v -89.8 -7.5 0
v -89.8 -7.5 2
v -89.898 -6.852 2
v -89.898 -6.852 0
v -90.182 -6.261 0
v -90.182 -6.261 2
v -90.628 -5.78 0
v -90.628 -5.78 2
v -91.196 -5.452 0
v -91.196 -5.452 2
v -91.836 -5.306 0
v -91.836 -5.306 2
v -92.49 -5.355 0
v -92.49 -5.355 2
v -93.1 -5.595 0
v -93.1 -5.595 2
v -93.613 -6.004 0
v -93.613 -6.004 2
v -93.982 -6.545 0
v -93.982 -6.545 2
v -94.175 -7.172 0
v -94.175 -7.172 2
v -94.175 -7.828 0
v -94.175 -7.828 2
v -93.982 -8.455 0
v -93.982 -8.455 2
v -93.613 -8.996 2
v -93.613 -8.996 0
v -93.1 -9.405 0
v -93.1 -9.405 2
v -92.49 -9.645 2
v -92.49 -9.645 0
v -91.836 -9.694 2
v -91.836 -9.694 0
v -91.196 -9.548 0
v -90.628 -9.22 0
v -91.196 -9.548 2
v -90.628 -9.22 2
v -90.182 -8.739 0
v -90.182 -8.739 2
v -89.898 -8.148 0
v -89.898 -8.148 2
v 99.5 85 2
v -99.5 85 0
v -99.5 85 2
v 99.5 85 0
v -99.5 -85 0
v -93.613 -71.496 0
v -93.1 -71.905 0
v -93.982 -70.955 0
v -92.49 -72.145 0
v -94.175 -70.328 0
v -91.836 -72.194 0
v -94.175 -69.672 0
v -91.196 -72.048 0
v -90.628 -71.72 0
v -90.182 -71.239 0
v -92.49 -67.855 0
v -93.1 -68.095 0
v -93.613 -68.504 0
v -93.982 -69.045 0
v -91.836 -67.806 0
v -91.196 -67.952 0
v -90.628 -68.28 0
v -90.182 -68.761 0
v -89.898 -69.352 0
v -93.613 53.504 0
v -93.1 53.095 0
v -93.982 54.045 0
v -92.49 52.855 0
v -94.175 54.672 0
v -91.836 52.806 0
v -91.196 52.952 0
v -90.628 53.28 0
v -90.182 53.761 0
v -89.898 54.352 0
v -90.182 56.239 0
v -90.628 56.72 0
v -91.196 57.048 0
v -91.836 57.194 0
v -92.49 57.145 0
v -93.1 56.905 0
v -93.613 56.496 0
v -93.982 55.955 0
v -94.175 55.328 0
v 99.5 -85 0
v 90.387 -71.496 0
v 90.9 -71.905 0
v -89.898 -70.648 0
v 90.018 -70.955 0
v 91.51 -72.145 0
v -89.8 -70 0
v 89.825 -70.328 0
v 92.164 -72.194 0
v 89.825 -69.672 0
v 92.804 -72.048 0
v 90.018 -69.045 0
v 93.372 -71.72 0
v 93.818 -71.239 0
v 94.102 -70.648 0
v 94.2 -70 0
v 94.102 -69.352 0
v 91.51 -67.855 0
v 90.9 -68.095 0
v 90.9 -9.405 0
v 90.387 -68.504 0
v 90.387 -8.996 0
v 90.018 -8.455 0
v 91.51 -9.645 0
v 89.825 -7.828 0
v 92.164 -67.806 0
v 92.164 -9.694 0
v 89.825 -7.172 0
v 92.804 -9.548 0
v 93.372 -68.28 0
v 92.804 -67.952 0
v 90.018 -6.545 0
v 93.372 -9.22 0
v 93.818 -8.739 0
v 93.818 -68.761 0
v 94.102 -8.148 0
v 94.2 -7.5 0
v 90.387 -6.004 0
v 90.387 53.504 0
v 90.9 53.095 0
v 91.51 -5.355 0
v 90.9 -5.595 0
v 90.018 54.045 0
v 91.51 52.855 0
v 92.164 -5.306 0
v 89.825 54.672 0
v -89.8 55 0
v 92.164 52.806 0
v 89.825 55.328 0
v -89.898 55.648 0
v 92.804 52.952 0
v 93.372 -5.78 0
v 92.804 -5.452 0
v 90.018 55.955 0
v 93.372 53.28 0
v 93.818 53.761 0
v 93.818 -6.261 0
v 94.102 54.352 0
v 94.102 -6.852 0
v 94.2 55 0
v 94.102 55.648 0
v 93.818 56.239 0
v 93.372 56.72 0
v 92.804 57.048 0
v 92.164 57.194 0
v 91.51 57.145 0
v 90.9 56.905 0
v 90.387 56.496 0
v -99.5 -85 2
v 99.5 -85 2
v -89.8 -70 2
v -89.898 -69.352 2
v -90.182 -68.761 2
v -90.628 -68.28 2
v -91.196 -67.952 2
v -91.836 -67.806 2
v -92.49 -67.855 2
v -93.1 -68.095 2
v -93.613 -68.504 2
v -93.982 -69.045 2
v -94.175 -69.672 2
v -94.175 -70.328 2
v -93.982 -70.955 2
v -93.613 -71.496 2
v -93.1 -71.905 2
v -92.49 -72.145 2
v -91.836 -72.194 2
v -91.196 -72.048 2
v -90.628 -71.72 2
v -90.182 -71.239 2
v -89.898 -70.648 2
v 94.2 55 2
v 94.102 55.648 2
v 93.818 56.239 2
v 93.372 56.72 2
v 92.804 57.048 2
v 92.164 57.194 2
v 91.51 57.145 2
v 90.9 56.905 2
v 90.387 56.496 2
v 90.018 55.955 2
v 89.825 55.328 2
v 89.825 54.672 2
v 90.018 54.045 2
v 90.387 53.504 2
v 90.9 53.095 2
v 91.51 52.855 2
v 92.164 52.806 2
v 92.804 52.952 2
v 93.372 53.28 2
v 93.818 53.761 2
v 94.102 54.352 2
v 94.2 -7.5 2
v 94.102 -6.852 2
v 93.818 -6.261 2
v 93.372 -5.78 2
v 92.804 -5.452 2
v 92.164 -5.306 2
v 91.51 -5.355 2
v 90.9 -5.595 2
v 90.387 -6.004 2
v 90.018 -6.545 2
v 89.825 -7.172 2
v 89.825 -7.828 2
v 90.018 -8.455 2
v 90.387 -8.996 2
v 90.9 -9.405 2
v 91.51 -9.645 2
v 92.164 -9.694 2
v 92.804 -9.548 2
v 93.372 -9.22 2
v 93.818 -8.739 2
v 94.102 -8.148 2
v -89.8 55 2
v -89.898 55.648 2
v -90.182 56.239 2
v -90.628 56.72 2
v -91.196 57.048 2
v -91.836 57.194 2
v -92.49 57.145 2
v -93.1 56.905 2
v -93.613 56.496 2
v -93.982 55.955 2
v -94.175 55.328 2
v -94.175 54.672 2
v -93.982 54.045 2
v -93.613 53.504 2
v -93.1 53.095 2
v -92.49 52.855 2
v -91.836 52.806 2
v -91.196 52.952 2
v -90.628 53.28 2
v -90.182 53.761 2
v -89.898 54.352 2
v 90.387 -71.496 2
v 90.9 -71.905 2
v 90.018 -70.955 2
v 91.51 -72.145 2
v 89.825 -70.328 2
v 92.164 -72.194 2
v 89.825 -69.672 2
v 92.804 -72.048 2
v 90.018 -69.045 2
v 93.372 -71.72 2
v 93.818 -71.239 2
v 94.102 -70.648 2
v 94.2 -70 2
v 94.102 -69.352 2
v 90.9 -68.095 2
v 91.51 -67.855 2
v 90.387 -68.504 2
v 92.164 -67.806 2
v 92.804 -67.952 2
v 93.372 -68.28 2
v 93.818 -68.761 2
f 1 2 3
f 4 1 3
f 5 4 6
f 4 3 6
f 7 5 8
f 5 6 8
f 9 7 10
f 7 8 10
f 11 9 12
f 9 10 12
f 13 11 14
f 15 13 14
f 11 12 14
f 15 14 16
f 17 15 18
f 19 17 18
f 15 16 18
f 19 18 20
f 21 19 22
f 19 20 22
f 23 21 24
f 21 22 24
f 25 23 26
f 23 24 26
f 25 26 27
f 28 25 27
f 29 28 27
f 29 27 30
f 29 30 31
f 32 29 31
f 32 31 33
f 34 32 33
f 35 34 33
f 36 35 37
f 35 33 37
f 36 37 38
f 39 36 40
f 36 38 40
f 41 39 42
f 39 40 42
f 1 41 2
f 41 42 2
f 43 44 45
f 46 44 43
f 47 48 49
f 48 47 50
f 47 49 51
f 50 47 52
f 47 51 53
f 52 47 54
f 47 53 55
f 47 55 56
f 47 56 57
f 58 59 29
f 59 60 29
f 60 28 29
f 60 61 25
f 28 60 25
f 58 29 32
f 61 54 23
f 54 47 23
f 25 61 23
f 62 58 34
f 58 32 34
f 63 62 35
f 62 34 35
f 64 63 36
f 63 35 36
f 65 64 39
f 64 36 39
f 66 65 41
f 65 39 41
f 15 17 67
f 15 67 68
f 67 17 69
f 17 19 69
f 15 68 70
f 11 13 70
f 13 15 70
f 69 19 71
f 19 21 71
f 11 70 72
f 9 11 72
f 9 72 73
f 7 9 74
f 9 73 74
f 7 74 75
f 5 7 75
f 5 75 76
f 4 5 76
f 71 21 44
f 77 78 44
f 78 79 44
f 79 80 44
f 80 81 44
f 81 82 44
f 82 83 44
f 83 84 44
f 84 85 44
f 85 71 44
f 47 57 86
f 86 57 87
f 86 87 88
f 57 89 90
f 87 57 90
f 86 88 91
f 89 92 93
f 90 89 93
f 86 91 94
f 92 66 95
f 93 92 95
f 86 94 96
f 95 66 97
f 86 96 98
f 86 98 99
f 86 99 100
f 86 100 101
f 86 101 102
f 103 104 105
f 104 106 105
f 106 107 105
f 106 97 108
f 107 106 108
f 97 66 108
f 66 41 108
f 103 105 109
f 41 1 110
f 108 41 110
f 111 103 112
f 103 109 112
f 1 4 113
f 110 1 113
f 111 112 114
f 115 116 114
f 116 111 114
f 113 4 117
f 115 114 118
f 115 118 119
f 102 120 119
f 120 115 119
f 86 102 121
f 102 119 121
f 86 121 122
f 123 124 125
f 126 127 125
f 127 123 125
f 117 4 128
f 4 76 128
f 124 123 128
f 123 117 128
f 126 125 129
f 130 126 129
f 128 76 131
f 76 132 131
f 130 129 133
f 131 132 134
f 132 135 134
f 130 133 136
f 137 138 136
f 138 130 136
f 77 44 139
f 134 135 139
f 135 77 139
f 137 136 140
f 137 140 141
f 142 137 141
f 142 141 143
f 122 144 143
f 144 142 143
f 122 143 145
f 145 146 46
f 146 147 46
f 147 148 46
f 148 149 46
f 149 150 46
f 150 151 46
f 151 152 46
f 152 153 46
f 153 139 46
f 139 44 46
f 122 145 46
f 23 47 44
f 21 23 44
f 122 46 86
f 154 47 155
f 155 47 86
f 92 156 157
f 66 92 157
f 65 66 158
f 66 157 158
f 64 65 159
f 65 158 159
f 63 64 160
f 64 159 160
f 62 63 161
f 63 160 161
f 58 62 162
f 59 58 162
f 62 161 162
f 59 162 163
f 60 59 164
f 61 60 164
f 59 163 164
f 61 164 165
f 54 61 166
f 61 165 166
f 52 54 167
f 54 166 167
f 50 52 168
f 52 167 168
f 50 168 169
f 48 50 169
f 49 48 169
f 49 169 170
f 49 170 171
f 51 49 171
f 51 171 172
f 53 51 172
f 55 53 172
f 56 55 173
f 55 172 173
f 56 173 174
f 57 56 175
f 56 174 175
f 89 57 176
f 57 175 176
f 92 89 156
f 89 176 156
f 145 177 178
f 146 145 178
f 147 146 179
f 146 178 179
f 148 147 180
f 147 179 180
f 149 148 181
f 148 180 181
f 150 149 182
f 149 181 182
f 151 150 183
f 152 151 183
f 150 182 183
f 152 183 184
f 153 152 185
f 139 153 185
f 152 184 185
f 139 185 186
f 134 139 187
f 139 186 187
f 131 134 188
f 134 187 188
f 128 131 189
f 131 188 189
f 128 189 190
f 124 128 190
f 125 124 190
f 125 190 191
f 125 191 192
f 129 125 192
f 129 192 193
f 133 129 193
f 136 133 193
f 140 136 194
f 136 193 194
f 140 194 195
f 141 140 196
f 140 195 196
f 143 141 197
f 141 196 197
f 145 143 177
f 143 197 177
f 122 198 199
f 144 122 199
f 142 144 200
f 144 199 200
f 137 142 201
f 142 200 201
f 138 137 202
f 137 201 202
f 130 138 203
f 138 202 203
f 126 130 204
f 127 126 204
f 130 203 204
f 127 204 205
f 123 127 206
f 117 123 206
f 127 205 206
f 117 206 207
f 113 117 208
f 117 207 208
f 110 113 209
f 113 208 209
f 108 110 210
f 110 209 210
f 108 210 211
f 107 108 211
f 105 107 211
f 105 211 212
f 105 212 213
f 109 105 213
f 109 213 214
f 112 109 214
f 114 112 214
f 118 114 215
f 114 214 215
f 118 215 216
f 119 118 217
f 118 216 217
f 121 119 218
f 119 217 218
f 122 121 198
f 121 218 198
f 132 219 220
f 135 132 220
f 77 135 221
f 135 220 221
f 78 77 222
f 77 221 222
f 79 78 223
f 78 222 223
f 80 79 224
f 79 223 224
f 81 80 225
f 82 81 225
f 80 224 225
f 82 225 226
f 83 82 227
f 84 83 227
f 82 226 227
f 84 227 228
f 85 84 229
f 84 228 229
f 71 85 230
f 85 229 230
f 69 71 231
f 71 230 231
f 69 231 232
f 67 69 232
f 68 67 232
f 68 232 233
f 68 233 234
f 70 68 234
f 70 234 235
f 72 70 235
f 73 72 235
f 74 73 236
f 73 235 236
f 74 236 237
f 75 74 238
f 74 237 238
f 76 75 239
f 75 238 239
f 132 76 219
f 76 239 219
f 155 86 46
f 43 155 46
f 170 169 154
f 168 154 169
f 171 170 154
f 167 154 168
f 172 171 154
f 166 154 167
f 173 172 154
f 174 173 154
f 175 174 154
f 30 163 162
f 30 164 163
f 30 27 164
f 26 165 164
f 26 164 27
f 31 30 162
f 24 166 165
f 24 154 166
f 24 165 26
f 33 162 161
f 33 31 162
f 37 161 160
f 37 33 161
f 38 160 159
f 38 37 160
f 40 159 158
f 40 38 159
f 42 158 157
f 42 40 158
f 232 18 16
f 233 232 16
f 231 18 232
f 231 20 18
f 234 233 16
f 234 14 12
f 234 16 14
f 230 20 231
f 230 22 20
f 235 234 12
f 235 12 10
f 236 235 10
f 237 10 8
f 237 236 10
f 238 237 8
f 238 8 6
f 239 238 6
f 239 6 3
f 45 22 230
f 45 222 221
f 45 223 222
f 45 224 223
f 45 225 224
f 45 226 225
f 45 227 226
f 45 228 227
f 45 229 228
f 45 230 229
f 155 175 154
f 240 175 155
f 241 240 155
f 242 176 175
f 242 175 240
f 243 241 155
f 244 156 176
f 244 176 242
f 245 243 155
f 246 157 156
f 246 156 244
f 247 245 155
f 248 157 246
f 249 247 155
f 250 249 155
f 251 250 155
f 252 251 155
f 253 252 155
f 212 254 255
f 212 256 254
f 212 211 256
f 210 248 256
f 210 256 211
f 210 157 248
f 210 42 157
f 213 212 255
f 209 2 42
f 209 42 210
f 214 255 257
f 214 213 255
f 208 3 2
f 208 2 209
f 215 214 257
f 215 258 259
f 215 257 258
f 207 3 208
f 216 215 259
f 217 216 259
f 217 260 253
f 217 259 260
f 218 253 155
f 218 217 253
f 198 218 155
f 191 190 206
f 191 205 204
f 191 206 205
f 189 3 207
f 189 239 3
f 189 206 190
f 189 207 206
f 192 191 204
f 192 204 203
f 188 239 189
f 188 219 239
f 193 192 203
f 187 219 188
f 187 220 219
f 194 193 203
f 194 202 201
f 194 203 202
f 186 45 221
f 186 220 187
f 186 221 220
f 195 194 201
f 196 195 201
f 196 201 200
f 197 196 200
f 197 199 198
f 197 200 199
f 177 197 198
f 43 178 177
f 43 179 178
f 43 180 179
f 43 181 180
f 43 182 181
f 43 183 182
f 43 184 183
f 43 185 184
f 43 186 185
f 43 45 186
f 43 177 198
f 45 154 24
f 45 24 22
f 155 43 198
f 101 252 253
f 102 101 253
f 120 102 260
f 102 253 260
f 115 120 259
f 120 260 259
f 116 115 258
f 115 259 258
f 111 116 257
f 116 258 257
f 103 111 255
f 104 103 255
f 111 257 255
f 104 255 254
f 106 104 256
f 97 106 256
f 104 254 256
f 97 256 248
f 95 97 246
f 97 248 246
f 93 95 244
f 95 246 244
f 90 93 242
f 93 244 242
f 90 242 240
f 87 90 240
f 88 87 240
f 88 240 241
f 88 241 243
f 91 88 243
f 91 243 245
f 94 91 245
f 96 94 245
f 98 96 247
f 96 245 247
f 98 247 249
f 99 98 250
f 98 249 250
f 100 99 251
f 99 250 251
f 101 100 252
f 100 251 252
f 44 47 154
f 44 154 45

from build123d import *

# Parameters (mm, degrees)
SKETCH_1_W          = 199
SKETCH_1_H          = 170
EXTRUDE_1_DEPTH     = 2
SKETCH_2_R          = 2.2
CUT_EXTRUDE_1_DEPTH = 2


with BuildPart() as part:
    # ｽｹｯﾁ1 → ﾎﾞｽ - 押し出し1 (new body)
    with BuildSketch(Plane.XY):
        Rectangle(SKETCH_1_W, SKETCH_1_H)
    extrude(amount=EXTRUDE_1_DEPTH)

    # ｽｹｯﾁ2 → ｶｯﾄ - 押し出し1 (cut)
    with BuildSketch(Plane.XY.offset(2)):
        with Locations((-92, -70)):
            Circle(SKETCH_2_R)
        with Locations((-92, -7.5)):
            Circle(SKETCH_2_R)
        with Locations((-92, 55)):
            Circle(SKETCH_2_R)
        with Locations((92, -70)):
            Circle(SKETCH_2_R)
        with Locations((92, -7.5)):
            Circle(SKETCH_2_R)
        with Locations((92, 55)):
            Circle(SKETCH_2_R)
    extrude(amount=-CUT_EXTRUDE_1_DEPTH, mode=Mode.SUBTRACT)


solid = part.part
